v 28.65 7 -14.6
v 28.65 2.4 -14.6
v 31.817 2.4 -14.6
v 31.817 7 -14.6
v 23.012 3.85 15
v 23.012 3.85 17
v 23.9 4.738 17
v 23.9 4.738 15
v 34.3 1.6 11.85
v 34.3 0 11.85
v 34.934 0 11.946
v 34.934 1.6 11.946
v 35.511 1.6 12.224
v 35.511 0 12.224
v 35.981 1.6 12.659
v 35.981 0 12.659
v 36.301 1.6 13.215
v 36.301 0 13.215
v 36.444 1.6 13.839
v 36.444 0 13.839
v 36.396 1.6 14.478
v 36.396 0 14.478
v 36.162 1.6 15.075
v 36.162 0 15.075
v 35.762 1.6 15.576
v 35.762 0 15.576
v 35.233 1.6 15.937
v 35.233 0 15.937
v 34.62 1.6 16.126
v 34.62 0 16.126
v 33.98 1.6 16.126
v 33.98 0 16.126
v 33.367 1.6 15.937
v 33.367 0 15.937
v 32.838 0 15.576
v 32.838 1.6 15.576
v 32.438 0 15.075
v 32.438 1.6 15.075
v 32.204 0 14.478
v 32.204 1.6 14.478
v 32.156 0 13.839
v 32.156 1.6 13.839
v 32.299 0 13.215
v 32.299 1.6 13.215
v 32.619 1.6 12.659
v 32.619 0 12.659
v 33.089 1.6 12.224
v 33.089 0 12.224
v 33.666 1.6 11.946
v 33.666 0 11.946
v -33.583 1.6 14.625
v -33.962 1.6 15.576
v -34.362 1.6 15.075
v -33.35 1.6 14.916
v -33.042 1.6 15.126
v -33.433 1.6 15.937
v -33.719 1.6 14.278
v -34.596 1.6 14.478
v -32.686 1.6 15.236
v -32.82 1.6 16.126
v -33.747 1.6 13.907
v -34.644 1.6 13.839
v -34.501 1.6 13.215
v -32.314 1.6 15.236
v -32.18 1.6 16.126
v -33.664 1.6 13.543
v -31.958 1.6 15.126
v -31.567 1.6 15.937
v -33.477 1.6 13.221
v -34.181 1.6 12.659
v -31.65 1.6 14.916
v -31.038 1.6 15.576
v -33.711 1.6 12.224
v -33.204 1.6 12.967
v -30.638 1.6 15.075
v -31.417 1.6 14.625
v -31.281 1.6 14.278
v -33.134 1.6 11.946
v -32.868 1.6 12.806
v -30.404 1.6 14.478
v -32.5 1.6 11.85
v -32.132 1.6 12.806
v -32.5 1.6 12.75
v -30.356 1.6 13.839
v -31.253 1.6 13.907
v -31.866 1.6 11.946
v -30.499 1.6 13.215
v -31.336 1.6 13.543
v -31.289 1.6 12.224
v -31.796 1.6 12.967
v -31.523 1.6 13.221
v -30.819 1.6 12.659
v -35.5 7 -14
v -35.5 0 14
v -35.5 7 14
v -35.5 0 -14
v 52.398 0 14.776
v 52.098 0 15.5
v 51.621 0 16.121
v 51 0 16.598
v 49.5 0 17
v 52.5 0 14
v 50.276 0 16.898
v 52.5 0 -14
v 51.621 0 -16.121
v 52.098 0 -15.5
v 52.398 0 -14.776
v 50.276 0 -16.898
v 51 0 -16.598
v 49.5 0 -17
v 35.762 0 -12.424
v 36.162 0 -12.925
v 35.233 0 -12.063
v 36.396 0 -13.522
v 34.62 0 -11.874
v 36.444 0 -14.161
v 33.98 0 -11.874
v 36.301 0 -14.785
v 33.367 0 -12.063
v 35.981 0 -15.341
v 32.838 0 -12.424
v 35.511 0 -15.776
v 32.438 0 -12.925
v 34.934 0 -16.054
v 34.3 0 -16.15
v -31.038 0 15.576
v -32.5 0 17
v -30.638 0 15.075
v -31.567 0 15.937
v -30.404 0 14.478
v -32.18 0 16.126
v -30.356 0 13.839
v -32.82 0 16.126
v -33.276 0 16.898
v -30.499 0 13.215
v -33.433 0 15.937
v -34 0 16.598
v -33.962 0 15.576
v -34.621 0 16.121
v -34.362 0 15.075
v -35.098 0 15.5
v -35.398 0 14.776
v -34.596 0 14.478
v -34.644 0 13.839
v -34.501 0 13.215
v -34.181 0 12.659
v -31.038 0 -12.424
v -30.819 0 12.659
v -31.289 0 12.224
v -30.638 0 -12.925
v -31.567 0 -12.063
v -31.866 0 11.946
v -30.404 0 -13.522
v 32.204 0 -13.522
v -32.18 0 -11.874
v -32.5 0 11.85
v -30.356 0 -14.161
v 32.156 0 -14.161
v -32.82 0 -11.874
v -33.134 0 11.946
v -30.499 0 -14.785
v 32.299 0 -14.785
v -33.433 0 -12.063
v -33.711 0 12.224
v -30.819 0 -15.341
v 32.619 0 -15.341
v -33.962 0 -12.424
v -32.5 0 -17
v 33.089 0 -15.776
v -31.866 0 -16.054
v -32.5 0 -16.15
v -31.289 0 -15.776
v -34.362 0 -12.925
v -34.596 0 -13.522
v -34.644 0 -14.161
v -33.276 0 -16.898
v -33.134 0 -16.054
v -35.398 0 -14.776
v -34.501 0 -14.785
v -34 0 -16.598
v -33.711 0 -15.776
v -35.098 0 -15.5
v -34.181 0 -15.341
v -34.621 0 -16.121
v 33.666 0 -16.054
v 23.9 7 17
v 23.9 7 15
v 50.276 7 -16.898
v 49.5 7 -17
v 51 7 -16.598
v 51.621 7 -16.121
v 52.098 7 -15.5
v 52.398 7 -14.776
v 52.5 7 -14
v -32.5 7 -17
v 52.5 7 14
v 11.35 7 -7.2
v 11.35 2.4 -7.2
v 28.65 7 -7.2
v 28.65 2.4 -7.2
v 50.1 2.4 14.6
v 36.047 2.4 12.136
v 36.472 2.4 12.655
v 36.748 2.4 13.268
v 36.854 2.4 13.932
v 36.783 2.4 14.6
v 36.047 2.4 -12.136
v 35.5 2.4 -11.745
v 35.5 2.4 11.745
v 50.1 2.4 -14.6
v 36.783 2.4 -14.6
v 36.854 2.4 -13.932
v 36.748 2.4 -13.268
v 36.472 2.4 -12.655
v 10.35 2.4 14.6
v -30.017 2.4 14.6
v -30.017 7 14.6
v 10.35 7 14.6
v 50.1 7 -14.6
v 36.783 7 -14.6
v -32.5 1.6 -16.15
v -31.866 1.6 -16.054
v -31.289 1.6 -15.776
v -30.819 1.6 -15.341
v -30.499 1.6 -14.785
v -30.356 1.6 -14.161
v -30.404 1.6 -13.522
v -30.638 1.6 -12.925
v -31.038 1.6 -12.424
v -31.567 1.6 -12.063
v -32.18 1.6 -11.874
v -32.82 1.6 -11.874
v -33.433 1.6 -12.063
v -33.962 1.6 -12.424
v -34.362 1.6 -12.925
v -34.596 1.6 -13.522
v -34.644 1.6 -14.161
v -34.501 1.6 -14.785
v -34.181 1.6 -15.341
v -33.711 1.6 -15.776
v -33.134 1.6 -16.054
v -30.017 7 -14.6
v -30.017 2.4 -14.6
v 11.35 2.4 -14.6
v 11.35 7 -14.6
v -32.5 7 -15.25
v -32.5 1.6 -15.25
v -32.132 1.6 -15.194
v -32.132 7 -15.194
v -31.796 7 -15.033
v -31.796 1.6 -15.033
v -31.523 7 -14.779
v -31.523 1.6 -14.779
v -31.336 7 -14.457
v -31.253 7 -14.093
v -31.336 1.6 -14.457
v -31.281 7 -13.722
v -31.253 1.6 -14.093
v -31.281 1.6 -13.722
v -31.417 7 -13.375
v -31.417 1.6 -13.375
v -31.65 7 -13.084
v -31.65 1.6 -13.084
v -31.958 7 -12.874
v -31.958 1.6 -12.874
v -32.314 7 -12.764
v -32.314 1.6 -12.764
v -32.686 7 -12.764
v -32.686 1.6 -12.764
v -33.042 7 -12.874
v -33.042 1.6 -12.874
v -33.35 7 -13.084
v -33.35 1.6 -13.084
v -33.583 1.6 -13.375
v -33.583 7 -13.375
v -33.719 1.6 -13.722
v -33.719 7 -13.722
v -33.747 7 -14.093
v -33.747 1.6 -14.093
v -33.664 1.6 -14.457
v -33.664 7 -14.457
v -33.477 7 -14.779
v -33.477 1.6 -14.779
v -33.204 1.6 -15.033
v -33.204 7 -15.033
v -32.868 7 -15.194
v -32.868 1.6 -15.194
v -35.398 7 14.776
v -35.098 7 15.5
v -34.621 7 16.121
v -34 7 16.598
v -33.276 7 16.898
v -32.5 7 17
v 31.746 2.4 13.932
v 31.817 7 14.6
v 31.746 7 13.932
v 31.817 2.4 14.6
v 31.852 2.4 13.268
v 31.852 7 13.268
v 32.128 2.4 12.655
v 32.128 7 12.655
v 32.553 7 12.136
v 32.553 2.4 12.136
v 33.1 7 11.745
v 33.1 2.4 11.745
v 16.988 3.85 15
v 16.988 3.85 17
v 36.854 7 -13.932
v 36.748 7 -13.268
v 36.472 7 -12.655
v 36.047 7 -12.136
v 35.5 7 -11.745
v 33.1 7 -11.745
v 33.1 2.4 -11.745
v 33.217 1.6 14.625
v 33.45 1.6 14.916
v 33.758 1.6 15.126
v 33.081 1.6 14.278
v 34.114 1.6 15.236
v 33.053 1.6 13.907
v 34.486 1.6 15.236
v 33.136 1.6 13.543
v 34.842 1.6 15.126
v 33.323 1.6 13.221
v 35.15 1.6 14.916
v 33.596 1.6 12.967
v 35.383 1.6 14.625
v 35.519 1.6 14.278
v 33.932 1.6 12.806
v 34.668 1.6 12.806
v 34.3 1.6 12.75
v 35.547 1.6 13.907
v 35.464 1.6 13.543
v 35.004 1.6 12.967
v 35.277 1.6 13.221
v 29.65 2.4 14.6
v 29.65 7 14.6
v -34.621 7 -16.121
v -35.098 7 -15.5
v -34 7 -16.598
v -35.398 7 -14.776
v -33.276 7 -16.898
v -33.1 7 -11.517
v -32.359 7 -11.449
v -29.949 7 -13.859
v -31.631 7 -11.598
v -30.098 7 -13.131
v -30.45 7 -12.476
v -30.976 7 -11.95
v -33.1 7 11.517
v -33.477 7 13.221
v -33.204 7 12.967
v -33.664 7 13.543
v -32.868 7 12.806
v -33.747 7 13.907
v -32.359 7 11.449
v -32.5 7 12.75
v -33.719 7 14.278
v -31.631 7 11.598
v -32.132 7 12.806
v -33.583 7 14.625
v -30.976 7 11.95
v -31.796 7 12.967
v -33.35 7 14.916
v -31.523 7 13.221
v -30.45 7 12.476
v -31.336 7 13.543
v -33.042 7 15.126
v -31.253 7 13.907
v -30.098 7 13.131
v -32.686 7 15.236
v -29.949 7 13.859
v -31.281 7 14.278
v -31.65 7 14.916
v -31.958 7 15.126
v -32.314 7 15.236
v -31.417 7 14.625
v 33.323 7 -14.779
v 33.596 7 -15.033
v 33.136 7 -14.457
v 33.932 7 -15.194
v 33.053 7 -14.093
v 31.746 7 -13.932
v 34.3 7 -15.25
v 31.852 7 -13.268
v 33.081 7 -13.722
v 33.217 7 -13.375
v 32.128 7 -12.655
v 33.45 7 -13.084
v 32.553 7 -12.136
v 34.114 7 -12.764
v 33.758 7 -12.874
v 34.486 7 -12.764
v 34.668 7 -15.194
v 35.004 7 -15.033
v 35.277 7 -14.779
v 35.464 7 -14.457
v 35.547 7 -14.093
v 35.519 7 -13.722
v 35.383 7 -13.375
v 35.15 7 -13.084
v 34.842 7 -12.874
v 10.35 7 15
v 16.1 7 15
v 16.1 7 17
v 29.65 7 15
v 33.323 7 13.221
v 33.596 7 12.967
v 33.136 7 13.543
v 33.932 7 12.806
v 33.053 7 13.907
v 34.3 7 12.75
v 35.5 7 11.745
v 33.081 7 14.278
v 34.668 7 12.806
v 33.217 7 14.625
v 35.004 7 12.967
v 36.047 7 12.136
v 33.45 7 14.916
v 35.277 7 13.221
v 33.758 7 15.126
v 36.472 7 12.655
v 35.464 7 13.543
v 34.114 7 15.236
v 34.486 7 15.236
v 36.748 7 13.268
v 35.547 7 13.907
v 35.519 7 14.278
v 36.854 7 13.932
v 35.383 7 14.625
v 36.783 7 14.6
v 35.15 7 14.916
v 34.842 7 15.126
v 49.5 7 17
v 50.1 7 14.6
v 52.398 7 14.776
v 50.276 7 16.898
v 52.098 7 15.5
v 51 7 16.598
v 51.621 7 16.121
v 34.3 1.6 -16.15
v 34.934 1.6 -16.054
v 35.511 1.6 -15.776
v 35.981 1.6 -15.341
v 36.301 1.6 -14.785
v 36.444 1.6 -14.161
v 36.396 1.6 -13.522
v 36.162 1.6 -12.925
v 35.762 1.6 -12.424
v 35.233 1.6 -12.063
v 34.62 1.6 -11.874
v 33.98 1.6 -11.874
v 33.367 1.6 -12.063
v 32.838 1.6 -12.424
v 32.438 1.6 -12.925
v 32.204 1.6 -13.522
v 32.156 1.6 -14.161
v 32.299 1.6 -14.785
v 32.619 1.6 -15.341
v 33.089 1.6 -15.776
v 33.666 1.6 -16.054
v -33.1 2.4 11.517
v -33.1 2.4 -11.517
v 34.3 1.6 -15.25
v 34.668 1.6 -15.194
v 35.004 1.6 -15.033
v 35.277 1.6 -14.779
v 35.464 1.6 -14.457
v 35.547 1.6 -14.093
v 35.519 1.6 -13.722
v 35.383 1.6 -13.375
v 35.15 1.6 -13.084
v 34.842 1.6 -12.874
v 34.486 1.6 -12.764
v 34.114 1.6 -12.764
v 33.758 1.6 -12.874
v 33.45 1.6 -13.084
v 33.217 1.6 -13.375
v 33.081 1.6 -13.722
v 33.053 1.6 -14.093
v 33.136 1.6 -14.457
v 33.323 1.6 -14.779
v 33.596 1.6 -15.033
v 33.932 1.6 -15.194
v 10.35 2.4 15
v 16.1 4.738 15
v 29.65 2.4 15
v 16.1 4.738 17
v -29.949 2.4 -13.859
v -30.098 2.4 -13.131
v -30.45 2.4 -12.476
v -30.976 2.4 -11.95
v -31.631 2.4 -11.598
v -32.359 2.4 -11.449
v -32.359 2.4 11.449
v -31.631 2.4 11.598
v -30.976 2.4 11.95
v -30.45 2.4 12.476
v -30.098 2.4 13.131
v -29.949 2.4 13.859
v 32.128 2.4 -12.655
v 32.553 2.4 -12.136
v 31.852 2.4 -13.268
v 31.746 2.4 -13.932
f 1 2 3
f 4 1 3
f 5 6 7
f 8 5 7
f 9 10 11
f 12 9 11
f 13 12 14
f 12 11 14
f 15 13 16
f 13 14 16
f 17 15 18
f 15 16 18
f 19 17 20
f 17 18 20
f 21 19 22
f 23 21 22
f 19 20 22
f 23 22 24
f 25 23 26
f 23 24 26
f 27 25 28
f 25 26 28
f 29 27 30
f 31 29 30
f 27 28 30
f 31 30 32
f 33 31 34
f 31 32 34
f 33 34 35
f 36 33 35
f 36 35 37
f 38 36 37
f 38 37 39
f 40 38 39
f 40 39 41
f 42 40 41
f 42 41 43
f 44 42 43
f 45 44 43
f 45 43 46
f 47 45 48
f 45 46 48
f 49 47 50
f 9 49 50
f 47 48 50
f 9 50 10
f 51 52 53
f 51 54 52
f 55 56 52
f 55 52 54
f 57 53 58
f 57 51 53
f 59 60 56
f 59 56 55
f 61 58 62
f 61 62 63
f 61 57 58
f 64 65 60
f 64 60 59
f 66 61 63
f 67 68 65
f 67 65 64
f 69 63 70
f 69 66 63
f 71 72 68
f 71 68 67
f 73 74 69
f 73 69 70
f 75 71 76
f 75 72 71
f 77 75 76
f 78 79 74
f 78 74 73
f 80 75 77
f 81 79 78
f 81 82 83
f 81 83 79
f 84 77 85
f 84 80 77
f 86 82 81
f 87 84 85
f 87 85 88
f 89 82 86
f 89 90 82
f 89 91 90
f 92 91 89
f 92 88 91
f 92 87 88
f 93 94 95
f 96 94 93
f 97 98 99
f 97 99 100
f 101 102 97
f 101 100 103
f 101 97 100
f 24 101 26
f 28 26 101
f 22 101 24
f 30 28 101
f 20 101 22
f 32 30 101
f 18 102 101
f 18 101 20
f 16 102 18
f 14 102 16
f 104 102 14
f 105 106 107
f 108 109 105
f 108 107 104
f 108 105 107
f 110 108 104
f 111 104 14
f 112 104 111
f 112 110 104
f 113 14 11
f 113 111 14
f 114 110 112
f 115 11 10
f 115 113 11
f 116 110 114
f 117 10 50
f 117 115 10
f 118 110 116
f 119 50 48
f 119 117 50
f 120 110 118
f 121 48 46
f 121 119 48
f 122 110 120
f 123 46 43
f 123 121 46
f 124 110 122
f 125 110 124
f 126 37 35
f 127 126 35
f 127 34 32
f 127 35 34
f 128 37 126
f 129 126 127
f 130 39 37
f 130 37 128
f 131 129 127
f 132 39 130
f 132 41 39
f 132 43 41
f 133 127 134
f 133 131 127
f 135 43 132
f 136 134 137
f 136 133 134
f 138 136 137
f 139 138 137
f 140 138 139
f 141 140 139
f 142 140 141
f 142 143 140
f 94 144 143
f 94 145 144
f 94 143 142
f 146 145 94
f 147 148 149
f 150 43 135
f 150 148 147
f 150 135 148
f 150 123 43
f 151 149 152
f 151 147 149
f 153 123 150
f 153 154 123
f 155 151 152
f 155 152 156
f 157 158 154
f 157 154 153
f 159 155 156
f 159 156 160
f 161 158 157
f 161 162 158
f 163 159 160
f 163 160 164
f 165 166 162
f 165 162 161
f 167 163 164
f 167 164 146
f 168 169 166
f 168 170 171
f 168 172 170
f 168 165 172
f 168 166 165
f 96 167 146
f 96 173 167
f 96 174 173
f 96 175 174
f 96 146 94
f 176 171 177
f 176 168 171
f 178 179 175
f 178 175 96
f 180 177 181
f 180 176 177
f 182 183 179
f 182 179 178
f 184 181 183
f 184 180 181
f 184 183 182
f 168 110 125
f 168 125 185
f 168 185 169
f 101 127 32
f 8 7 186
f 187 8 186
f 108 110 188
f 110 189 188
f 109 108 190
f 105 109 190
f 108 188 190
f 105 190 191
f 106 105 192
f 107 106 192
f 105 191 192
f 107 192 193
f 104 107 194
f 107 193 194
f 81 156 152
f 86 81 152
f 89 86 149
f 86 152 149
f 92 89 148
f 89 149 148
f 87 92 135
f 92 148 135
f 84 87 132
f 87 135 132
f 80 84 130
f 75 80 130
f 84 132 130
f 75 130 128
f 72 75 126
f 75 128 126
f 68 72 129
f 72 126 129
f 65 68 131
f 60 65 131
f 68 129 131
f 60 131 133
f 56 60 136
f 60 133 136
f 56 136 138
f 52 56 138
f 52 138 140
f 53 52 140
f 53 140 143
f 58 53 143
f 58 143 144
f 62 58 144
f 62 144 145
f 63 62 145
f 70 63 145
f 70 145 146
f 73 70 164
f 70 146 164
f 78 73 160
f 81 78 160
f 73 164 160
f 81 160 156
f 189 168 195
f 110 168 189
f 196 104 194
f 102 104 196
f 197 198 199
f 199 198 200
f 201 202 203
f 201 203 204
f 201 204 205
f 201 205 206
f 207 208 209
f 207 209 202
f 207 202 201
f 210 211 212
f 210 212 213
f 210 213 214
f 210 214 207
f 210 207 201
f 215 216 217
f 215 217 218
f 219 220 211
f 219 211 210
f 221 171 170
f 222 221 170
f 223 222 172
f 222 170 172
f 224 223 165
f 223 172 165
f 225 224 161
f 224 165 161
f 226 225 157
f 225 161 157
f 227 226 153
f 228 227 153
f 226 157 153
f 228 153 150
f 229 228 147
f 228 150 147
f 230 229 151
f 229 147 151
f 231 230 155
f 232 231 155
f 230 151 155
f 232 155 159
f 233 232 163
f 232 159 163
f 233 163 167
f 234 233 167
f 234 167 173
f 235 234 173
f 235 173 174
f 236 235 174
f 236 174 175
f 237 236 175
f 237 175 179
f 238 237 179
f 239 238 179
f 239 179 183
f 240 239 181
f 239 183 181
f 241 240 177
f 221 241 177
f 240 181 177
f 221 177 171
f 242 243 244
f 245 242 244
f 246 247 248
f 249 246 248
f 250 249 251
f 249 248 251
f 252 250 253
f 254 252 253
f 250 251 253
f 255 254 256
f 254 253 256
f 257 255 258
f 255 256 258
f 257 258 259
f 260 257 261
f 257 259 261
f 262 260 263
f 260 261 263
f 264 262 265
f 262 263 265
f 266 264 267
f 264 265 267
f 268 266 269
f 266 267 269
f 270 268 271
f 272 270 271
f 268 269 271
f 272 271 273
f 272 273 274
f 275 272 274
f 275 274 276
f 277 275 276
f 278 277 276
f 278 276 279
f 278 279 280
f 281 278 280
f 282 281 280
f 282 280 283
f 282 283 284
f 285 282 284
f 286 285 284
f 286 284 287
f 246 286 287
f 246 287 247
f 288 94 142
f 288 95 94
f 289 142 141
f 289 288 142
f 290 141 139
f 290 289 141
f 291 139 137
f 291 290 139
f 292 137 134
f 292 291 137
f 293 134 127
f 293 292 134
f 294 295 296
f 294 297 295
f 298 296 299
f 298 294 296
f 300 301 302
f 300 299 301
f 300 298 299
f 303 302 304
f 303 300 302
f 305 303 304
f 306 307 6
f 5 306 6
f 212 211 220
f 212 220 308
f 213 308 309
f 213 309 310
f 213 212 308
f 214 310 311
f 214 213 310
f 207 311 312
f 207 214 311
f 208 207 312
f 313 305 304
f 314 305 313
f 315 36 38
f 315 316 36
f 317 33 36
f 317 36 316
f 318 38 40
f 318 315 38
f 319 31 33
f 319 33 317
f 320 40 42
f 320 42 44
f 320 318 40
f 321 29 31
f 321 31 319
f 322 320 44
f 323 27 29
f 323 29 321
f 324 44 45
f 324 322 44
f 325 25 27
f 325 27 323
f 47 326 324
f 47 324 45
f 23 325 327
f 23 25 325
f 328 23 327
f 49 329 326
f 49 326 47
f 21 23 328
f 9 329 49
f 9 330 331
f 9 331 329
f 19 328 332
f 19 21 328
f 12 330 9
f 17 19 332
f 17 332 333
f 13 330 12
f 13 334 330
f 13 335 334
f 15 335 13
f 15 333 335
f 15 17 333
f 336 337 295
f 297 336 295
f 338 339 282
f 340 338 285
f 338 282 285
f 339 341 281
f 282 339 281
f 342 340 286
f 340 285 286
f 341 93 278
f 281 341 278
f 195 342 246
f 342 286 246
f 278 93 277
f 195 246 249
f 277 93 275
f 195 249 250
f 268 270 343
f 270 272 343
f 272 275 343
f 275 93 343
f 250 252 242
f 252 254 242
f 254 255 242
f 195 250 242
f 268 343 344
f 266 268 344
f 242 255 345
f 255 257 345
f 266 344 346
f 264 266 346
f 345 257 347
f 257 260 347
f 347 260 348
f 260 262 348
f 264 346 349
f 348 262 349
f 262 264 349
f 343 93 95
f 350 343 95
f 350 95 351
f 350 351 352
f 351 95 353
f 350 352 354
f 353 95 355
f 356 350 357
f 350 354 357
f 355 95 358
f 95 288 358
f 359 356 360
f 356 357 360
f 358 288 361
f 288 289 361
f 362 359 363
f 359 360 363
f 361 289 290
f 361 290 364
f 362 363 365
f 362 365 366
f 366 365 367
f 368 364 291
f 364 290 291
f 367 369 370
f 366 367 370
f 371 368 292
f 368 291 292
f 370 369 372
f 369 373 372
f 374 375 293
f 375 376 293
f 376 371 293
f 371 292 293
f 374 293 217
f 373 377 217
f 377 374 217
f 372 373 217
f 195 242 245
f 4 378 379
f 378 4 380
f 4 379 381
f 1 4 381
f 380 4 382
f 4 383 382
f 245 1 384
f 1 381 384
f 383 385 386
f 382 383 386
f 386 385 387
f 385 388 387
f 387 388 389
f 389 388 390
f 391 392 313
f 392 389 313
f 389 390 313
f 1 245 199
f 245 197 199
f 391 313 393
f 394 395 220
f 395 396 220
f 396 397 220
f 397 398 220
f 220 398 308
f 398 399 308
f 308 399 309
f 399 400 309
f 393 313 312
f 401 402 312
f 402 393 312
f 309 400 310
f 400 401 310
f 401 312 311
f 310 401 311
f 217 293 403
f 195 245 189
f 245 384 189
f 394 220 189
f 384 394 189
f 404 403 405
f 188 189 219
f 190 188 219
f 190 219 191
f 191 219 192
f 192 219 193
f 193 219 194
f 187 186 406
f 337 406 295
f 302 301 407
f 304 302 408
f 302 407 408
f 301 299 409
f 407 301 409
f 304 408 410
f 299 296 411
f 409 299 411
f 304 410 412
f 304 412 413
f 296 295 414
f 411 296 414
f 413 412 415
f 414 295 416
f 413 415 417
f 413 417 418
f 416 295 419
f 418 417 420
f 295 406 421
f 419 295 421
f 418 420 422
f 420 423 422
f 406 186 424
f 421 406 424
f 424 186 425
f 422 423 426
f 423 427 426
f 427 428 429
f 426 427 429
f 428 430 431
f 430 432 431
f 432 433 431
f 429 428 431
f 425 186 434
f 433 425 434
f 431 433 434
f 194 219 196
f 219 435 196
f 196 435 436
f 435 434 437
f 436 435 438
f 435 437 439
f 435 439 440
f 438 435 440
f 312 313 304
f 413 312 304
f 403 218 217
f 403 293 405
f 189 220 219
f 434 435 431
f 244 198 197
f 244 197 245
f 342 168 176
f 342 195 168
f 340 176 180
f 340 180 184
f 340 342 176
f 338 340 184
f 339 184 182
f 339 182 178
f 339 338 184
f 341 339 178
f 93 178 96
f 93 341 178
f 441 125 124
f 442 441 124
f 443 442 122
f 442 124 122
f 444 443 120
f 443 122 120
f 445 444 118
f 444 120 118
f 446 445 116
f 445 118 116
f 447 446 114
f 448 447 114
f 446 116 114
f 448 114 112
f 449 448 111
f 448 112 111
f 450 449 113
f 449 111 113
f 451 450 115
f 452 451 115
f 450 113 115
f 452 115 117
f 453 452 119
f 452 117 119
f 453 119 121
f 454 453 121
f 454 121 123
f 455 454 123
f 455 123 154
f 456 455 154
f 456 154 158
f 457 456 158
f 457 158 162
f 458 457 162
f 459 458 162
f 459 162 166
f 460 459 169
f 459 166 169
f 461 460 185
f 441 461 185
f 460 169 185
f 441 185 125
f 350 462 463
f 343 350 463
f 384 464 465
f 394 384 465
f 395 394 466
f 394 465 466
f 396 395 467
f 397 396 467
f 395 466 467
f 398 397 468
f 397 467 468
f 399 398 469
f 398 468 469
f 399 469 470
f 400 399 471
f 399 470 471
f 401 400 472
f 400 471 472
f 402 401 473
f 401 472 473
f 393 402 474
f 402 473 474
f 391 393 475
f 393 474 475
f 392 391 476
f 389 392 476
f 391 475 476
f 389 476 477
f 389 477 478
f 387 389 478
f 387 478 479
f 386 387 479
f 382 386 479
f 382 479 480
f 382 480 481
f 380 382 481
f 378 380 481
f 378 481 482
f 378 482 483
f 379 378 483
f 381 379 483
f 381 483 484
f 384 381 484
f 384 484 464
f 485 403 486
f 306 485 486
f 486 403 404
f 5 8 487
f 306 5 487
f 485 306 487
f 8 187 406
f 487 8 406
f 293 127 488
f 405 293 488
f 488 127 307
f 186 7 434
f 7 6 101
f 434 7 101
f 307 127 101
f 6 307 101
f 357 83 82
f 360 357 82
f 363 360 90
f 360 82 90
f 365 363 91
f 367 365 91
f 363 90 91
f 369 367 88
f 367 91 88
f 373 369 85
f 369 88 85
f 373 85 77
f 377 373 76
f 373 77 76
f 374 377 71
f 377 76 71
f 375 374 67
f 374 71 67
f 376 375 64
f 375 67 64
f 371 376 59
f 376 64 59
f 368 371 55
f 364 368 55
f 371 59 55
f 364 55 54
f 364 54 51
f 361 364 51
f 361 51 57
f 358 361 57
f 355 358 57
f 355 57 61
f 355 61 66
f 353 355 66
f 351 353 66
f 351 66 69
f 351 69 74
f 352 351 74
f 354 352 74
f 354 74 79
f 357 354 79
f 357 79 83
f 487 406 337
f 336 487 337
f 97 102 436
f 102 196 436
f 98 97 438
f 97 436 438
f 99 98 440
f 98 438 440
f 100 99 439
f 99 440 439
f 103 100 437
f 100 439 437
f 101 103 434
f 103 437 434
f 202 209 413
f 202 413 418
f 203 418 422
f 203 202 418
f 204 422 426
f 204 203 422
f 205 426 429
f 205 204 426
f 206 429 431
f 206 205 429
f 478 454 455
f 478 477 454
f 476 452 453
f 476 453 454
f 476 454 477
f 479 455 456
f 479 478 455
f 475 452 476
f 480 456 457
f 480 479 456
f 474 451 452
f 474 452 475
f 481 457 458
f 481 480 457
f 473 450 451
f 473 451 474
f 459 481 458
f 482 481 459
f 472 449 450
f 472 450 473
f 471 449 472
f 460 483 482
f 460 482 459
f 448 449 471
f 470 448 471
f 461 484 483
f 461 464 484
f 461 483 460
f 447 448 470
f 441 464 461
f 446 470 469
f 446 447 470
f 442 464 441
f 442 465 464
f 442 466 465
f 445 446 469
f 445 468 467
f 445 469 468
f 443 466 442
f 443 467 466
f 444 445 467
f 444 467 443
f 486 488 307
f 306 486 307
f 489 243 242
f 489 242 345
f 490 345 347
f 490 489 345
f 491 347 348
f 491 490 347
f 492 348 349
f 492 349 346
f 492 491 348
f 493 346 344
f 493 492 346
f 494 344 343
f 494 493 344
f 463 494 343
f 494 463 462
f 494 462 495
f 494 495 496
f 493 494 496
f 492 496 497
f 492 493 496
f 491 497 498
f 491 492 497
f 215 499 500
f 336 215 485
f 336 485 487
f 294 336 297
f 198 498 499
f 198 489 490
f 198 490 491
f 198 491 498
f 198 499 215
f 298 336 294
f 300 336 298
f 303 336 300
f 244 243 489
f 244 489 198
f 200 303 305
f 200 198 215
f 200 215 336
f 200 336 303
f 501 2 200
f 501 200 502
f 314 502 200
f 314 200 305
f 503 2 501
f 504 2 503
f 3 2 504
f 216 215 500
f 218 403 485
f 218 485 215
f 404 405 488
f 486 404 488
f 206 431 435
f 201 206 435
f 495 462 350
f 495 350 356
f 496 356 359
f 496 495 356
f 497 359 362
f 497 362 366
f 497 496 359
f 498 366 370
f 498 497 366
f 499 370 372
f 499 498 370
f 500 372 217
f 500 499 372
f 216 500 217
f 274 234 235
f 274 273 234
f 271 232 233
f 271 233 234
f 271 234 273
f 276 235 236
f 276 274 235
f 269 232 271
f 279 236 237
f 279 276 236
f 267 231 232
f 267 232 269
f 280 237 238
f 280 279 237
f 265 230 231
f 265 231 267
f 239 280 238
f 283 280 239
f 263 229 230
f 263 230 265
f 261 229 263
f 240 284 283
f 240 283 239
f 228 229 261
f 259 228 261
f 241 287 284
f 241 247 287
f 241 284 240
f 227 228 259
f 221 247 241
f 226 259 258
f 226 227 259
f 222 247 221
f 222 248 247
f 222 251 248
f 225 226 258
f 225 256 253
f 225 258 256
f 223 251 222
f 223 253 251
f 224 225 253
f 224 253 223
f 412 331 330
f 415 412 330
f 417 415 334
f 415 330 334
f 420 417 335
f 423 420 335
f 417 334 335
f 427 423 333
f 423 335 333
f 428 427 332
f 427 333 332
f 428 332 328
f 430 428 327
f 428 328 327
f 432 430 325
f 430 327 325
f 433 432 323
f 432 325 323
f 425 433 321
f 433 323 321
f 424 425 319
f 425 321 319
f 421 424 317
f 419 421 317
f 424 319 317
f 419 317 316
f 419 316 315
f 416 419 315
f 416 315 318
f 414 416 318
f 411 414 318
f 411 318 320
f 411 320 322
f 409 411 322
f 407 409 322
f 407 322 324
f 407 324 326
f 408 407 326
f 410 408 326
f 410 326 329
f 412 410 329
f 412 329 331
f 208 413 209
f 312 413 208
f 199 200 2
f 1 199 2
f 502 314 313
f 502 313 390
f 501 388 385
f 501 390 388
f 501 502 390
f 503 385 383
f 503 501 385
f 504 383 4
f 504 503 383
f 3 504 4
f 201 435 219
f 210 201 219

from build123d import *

# Parameters (mm, degrees)
SKETCH1_W           = 71
SKETCH1_H           = 34
BOSS_EXTRUDE1_DEPTH = 7
SHELL1_T            = -2.4
SKETCH3_W           = 17
SKETCH3_H           = 34
BOSS_EXTRUDE2_DEPTH = 7
SKETCH4_W           = 14.6
SKETCH4_H           = 29.2
CUT_EXTRUDE2_DEPTH  = 4.6
SKETCH5_W           = 19.3
SKETCH5_H           = 0.4
CUT_EXTRUDE3_DEPTH  = 4.6
CUT_EXTRUDE4_DEPTH  = 2
SKETCH7_W           = 17.3
SKETCH7_H           = 7.4
BOSS_EXTRUDE3_DEPTH = 4.6
FILLET1_R           = 3
SKETCH8_R           = 2.5546875
BOSS_EXTRUDE4_DEPTH = 7
CUT_EXTRUDE5_REACH  = 57.626
SKETCH9_R           = 1.25
SKETCH10_R          = 2.15
CUT_EXTRUDE6_DEPTH  = 1.6


with BuildPart() as part:
    # Sketch1 → Boss-Extrude1 (new body)
    with BuildSketch(Plane(origin=(0, 0, 0), x_dir=(1, 0, 0), z_dir=(0, 1, 0))):
        Rectangle(SKETCH1_W, SKETCH1_H)
    extrude(amount=BOSS_EXTRUDE1_DEPTH)

    # Shell1
    shell1_openings = [part.faces().sort_by_distance(p)[0] for p in [
        (0, 7, 0),
    ]]
    offset(amount=SHELL1_T, openings=shell1_openings, kind=Kind.INTERSECTION)

    # Sketch3 → Boss-Extrude2 (add)
    with BuildSketch(Plane.XZ):
        with Locations((44, 0)):
            Rectangle(SKETCH3_W, SKETCH3_H)
    extrude(amount=-BOSS_EXTRUDE2_DEPTH)

    # Sketch4 → Cut-Extrude2 (cut)
    with BuildSketch(Plane(origin=(0, 7, 0), x_dir=(1, 0, 0), z_dir=(0, 1, 0))):
        with Locations((42.8, 0)):
            Rectangle(SKETCH4_W, SKETCH4_H)
    extrude(amount=-CUT_EXTRUDE2_DEPTH, mode=Mode.SUBTRACT)

    # Sketch5 → Cut-Extrude3 (cut)
    with BuildSketch(Plane(origin=(0, 7, 0), x_dir=(1, 0, 0), z_dir=(0, 1, 0))):
        with Locations((20, -14.8)):
            Rectangle(SKETCH5_W, SKETCH5_H)
    extrude(amount=-CUT_EXTRUDE3_DEPTH, mode=Mode.SUBTRACT)

    # Sketch6 → Cut-Extrude4 (cut)
    with BuildSketch(Plane.XY.offset(17)):
        Polygon((16.1, 4.737867966), (16.987867966, 3.85), (23.012132034, 3.85), (23.9, 4.737867966), (23.9, 6.3), (23.9, 7), (16.1, 7), (16.1, 6.3), align=None)
    extrude(amount=-CUT_EXTRUDE4_DEPTH, mode=Mode.SUBTRACT)

    # Sketch7 → Boss-Extrude3 (add)
    with BuildSketch(Plane(origin=(0, 2.4, 0), x_dir=(1, 0, 0), z_dir=(0, 1, 0))):
        with Locations((20, 10.9)):
            Rectangle(SKETCH7_W, SKETCH7_H)
    extrude(amount=BOSS_EXTRUDE3_DEPTH)

    # Fillet1
    fillet1_edges = [part.edges().sort_by_distance(p)[0] for p in [
        (52.5, 3.5, -17),
        (52.5, 3.5, 17),
        (-35.5, 3.5, 17),
        (-35.5, 3.5, -17),
    ]]
    fillet(fillet1_edges, radius=FILLET1_R)

    # Sketch8 → Boss-Extrude4 (add)
    with BuildSketch(Plane(origin=(0, 0, 0), x_dir=(-1, 0, 0), z_dir=(0, -1, 0))):
        with Locations((32.5, 14)):
            Circle(SKETCH8_R)
        with Locations((32.5, -14)):
            Circle(SKETCH8_R)
        with Locations((-34.3, 14)):
            Circle(SKETCH8_R)
        with Locations((-34.3, -14)):
            Circle(SKETCH8_R)
    extrude(amount=-BOSS_EXTRUDE4_DEPTH)

    # Sketch9 → Cut-Extrude5 (cut, up to next)
    with BuildSketch(Plane.XZ, mode=Mode.PRIVATE) as cut_extrude5_sk1:
        with Locations(Location((-32.5, -14, 0), (0, 0, 270))):
            Circle(SKETCH9_R)
    cut_extrude5_tool1 = extrude(cut_extrude5_sk1.sketch, amount=-CUT_EXTRUDE5_REACH, mode=Mode.PRIVATE) & part.part
    # Sketch9 → Cut-Extrude5 (cut, up to next)
    with BuildSketch(Plane.XZ, mode=Mode.PRIVATE) as cut_extrude5_sk2:
        with Locations(Location((-32.5, 14, 0), (0, 0, 270))):
            Circle(SKETCH9_R)
    cut_extrude5_tool2 = extrude(cut_extrude5_sk2.sketch, amount=-CUT_EXTRUDE5_REACH, mode=Mode.PRIVATE) & part.part
    # Sketch9 → Cut-Extrude5 (cut, up to next)
    with BuildSketch(Plane.XZ, mode=Mode.PRIVATE) as cut_extrude5_sk3:
        with Locations(Location((34.3, -14, 0), (0, 0, 270))):
            Circle(SKETCH9_R)
    cut_extrude5_tool3 = extrude(cut_extrude5_sk3.sketch, amount=-CUT_EXTRUDE5_REACH, mode=Mode.PRIVATE) & part.part
    # Sketch9 → Cut-Extrude5 (cut, up to next)
    with BuildSketch(Plane.XZ, mode=Mode.PRIVATE) as cut_extrude5_sk4:
        with Locations(Location((34.3, 14, 0), (0, 0, 270))):
            Circle(SKETCH9_R)
    cut_extrude5_tool4 = extrude(cut_extrude5_sk4.sketch, amount=-CUT_EXTRUDE5_REACH, mode=Mode.PRIVATE) & part.part
    add(cut_extrude5_tool1.solids().sort_by_distance((-32.5, 0, -14))[0], mode=Mode.SUBTRACT)
    add(cut_extrude5_tool2.solids().sort_by_distance((-32.5, 0, 14))[0], mode=Mode.SUBTRACT)
    add(cut_extrude5_tool3.solids().sort_by_distance((34.3, 0, -14))[0], mode=Mode.SUBTRACT)
    add(cut_extrude5_tool4.solids().sort_by_distance((34.3, 0, 14))[0], mode=Mode.SUBTRACT)

    # Sketch10 → Cut-Extrude6 (cut)
    with BuildSketch(Plane.XZ):
        with Locations(Location((34.3, 14, 0), (0, 0, 270))):
            Circle(SKETCH10_R)
        with Locations(Location((-32.5, -14, 0), (0, 0, 270))):
            Circle(SKETCH10_R)
        with Locations(Location((-32.5, 14, 0), (0, 0, 270))):
            Circle(SKETCH10_R)
        with Locations(Location((34.3, -14, 0), (0, 0, 270))):
            Circle(SKETCH10_R)
    extrude(amount=-CUT_EXTRUDE6_DEPTH, mode=Mode.SUBTRACT)


solid = part.part
